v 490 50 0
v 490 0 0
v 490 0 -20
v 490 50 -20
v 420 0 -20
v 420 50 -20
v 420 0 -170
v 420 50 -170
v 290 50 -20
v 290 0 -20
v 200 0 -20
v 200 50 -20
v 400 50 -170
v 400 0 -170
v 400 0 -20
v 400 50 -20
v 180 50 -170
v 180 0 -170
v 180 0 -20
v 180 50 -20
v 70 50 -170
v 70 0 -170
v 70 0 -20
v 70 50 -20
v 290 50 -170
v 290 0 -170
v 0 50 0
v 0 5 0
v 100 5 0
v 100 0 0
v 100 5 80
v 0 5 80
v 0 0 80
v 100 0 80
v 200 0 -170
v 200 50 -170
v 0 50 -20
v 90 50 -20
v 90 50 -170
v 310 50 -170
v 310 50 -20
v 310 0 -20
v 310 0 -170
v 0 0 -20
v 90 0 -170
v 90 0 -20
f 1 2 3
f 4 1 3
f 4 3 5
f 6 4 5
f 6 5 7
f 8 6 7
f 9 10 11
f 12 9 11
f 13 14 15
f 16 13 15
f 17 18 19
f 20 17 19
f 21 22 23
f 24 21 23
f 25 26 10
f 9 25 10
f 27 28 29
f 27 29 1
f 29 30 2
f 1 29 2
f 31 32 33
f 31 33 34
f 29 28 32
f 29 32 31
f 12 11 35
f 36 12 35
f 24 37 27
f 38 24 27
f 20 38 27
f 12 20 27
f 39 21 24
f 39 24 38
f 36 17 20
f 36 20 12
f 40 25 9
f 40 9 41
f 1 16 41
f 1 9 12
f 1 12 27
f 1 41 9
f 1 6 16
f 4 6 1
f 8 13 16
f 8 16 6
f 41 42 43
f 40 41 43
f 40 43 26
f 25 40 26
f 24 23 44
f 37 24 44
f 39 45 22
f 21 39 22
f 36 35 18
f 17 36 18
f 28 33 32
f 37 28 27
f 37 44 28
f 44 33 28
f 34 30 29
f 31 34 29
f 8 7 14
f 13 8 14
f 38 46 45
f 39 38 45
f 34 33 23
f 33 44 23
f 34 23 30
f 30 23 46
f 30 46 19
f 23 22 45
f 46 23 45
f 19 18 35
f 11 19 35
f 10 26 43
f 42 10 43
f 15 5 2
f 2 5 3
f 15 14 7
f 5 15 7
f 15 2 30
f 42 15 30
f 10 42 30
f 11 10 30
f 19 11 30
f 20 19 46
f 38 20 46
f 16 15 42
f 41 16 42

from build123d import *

# Parameters (mm, degrees)
BOSS_EXTRUDE1_DEPTH = 50
SKETCH2_W           = 100
SKETCH2_H           = 5
BOSS_EXTRUDE2_DEPTH = 80


with BuildPart() as part:
    # Sketch1 → Boss-Extrude1 (new body)
    with BuildSketch(Plane(origin=(0, 0, 0), x_dir=(1, 0, 0), z_dir=(0, 1, 0))):
        Polygon((0, 0), (490, 0), (490, 20), (420, 20), (420, 170), (400, 170), (400, 20), (310, 20), (310, 170), (290, 170), (290, 20), (200, 20), (200, 170), (180, 170), (180, 20), (90, 20), (90, 170), (70, 170), (70, 20), (0, 20), align=None)
    extrude(amount=BOSS_EXTRUDE1_DEPTH)

    # Sketch2 → Boss-Extrude2 (add)
    with BuildSketch(Plane.XY):
        with Locations((50, 2.5)):
            Rectangle(SKETCH2_W, SKETCH2_H)
    extrude(amount=BOSS_EXTRUDE2_DEPTH)


solid = part.part
